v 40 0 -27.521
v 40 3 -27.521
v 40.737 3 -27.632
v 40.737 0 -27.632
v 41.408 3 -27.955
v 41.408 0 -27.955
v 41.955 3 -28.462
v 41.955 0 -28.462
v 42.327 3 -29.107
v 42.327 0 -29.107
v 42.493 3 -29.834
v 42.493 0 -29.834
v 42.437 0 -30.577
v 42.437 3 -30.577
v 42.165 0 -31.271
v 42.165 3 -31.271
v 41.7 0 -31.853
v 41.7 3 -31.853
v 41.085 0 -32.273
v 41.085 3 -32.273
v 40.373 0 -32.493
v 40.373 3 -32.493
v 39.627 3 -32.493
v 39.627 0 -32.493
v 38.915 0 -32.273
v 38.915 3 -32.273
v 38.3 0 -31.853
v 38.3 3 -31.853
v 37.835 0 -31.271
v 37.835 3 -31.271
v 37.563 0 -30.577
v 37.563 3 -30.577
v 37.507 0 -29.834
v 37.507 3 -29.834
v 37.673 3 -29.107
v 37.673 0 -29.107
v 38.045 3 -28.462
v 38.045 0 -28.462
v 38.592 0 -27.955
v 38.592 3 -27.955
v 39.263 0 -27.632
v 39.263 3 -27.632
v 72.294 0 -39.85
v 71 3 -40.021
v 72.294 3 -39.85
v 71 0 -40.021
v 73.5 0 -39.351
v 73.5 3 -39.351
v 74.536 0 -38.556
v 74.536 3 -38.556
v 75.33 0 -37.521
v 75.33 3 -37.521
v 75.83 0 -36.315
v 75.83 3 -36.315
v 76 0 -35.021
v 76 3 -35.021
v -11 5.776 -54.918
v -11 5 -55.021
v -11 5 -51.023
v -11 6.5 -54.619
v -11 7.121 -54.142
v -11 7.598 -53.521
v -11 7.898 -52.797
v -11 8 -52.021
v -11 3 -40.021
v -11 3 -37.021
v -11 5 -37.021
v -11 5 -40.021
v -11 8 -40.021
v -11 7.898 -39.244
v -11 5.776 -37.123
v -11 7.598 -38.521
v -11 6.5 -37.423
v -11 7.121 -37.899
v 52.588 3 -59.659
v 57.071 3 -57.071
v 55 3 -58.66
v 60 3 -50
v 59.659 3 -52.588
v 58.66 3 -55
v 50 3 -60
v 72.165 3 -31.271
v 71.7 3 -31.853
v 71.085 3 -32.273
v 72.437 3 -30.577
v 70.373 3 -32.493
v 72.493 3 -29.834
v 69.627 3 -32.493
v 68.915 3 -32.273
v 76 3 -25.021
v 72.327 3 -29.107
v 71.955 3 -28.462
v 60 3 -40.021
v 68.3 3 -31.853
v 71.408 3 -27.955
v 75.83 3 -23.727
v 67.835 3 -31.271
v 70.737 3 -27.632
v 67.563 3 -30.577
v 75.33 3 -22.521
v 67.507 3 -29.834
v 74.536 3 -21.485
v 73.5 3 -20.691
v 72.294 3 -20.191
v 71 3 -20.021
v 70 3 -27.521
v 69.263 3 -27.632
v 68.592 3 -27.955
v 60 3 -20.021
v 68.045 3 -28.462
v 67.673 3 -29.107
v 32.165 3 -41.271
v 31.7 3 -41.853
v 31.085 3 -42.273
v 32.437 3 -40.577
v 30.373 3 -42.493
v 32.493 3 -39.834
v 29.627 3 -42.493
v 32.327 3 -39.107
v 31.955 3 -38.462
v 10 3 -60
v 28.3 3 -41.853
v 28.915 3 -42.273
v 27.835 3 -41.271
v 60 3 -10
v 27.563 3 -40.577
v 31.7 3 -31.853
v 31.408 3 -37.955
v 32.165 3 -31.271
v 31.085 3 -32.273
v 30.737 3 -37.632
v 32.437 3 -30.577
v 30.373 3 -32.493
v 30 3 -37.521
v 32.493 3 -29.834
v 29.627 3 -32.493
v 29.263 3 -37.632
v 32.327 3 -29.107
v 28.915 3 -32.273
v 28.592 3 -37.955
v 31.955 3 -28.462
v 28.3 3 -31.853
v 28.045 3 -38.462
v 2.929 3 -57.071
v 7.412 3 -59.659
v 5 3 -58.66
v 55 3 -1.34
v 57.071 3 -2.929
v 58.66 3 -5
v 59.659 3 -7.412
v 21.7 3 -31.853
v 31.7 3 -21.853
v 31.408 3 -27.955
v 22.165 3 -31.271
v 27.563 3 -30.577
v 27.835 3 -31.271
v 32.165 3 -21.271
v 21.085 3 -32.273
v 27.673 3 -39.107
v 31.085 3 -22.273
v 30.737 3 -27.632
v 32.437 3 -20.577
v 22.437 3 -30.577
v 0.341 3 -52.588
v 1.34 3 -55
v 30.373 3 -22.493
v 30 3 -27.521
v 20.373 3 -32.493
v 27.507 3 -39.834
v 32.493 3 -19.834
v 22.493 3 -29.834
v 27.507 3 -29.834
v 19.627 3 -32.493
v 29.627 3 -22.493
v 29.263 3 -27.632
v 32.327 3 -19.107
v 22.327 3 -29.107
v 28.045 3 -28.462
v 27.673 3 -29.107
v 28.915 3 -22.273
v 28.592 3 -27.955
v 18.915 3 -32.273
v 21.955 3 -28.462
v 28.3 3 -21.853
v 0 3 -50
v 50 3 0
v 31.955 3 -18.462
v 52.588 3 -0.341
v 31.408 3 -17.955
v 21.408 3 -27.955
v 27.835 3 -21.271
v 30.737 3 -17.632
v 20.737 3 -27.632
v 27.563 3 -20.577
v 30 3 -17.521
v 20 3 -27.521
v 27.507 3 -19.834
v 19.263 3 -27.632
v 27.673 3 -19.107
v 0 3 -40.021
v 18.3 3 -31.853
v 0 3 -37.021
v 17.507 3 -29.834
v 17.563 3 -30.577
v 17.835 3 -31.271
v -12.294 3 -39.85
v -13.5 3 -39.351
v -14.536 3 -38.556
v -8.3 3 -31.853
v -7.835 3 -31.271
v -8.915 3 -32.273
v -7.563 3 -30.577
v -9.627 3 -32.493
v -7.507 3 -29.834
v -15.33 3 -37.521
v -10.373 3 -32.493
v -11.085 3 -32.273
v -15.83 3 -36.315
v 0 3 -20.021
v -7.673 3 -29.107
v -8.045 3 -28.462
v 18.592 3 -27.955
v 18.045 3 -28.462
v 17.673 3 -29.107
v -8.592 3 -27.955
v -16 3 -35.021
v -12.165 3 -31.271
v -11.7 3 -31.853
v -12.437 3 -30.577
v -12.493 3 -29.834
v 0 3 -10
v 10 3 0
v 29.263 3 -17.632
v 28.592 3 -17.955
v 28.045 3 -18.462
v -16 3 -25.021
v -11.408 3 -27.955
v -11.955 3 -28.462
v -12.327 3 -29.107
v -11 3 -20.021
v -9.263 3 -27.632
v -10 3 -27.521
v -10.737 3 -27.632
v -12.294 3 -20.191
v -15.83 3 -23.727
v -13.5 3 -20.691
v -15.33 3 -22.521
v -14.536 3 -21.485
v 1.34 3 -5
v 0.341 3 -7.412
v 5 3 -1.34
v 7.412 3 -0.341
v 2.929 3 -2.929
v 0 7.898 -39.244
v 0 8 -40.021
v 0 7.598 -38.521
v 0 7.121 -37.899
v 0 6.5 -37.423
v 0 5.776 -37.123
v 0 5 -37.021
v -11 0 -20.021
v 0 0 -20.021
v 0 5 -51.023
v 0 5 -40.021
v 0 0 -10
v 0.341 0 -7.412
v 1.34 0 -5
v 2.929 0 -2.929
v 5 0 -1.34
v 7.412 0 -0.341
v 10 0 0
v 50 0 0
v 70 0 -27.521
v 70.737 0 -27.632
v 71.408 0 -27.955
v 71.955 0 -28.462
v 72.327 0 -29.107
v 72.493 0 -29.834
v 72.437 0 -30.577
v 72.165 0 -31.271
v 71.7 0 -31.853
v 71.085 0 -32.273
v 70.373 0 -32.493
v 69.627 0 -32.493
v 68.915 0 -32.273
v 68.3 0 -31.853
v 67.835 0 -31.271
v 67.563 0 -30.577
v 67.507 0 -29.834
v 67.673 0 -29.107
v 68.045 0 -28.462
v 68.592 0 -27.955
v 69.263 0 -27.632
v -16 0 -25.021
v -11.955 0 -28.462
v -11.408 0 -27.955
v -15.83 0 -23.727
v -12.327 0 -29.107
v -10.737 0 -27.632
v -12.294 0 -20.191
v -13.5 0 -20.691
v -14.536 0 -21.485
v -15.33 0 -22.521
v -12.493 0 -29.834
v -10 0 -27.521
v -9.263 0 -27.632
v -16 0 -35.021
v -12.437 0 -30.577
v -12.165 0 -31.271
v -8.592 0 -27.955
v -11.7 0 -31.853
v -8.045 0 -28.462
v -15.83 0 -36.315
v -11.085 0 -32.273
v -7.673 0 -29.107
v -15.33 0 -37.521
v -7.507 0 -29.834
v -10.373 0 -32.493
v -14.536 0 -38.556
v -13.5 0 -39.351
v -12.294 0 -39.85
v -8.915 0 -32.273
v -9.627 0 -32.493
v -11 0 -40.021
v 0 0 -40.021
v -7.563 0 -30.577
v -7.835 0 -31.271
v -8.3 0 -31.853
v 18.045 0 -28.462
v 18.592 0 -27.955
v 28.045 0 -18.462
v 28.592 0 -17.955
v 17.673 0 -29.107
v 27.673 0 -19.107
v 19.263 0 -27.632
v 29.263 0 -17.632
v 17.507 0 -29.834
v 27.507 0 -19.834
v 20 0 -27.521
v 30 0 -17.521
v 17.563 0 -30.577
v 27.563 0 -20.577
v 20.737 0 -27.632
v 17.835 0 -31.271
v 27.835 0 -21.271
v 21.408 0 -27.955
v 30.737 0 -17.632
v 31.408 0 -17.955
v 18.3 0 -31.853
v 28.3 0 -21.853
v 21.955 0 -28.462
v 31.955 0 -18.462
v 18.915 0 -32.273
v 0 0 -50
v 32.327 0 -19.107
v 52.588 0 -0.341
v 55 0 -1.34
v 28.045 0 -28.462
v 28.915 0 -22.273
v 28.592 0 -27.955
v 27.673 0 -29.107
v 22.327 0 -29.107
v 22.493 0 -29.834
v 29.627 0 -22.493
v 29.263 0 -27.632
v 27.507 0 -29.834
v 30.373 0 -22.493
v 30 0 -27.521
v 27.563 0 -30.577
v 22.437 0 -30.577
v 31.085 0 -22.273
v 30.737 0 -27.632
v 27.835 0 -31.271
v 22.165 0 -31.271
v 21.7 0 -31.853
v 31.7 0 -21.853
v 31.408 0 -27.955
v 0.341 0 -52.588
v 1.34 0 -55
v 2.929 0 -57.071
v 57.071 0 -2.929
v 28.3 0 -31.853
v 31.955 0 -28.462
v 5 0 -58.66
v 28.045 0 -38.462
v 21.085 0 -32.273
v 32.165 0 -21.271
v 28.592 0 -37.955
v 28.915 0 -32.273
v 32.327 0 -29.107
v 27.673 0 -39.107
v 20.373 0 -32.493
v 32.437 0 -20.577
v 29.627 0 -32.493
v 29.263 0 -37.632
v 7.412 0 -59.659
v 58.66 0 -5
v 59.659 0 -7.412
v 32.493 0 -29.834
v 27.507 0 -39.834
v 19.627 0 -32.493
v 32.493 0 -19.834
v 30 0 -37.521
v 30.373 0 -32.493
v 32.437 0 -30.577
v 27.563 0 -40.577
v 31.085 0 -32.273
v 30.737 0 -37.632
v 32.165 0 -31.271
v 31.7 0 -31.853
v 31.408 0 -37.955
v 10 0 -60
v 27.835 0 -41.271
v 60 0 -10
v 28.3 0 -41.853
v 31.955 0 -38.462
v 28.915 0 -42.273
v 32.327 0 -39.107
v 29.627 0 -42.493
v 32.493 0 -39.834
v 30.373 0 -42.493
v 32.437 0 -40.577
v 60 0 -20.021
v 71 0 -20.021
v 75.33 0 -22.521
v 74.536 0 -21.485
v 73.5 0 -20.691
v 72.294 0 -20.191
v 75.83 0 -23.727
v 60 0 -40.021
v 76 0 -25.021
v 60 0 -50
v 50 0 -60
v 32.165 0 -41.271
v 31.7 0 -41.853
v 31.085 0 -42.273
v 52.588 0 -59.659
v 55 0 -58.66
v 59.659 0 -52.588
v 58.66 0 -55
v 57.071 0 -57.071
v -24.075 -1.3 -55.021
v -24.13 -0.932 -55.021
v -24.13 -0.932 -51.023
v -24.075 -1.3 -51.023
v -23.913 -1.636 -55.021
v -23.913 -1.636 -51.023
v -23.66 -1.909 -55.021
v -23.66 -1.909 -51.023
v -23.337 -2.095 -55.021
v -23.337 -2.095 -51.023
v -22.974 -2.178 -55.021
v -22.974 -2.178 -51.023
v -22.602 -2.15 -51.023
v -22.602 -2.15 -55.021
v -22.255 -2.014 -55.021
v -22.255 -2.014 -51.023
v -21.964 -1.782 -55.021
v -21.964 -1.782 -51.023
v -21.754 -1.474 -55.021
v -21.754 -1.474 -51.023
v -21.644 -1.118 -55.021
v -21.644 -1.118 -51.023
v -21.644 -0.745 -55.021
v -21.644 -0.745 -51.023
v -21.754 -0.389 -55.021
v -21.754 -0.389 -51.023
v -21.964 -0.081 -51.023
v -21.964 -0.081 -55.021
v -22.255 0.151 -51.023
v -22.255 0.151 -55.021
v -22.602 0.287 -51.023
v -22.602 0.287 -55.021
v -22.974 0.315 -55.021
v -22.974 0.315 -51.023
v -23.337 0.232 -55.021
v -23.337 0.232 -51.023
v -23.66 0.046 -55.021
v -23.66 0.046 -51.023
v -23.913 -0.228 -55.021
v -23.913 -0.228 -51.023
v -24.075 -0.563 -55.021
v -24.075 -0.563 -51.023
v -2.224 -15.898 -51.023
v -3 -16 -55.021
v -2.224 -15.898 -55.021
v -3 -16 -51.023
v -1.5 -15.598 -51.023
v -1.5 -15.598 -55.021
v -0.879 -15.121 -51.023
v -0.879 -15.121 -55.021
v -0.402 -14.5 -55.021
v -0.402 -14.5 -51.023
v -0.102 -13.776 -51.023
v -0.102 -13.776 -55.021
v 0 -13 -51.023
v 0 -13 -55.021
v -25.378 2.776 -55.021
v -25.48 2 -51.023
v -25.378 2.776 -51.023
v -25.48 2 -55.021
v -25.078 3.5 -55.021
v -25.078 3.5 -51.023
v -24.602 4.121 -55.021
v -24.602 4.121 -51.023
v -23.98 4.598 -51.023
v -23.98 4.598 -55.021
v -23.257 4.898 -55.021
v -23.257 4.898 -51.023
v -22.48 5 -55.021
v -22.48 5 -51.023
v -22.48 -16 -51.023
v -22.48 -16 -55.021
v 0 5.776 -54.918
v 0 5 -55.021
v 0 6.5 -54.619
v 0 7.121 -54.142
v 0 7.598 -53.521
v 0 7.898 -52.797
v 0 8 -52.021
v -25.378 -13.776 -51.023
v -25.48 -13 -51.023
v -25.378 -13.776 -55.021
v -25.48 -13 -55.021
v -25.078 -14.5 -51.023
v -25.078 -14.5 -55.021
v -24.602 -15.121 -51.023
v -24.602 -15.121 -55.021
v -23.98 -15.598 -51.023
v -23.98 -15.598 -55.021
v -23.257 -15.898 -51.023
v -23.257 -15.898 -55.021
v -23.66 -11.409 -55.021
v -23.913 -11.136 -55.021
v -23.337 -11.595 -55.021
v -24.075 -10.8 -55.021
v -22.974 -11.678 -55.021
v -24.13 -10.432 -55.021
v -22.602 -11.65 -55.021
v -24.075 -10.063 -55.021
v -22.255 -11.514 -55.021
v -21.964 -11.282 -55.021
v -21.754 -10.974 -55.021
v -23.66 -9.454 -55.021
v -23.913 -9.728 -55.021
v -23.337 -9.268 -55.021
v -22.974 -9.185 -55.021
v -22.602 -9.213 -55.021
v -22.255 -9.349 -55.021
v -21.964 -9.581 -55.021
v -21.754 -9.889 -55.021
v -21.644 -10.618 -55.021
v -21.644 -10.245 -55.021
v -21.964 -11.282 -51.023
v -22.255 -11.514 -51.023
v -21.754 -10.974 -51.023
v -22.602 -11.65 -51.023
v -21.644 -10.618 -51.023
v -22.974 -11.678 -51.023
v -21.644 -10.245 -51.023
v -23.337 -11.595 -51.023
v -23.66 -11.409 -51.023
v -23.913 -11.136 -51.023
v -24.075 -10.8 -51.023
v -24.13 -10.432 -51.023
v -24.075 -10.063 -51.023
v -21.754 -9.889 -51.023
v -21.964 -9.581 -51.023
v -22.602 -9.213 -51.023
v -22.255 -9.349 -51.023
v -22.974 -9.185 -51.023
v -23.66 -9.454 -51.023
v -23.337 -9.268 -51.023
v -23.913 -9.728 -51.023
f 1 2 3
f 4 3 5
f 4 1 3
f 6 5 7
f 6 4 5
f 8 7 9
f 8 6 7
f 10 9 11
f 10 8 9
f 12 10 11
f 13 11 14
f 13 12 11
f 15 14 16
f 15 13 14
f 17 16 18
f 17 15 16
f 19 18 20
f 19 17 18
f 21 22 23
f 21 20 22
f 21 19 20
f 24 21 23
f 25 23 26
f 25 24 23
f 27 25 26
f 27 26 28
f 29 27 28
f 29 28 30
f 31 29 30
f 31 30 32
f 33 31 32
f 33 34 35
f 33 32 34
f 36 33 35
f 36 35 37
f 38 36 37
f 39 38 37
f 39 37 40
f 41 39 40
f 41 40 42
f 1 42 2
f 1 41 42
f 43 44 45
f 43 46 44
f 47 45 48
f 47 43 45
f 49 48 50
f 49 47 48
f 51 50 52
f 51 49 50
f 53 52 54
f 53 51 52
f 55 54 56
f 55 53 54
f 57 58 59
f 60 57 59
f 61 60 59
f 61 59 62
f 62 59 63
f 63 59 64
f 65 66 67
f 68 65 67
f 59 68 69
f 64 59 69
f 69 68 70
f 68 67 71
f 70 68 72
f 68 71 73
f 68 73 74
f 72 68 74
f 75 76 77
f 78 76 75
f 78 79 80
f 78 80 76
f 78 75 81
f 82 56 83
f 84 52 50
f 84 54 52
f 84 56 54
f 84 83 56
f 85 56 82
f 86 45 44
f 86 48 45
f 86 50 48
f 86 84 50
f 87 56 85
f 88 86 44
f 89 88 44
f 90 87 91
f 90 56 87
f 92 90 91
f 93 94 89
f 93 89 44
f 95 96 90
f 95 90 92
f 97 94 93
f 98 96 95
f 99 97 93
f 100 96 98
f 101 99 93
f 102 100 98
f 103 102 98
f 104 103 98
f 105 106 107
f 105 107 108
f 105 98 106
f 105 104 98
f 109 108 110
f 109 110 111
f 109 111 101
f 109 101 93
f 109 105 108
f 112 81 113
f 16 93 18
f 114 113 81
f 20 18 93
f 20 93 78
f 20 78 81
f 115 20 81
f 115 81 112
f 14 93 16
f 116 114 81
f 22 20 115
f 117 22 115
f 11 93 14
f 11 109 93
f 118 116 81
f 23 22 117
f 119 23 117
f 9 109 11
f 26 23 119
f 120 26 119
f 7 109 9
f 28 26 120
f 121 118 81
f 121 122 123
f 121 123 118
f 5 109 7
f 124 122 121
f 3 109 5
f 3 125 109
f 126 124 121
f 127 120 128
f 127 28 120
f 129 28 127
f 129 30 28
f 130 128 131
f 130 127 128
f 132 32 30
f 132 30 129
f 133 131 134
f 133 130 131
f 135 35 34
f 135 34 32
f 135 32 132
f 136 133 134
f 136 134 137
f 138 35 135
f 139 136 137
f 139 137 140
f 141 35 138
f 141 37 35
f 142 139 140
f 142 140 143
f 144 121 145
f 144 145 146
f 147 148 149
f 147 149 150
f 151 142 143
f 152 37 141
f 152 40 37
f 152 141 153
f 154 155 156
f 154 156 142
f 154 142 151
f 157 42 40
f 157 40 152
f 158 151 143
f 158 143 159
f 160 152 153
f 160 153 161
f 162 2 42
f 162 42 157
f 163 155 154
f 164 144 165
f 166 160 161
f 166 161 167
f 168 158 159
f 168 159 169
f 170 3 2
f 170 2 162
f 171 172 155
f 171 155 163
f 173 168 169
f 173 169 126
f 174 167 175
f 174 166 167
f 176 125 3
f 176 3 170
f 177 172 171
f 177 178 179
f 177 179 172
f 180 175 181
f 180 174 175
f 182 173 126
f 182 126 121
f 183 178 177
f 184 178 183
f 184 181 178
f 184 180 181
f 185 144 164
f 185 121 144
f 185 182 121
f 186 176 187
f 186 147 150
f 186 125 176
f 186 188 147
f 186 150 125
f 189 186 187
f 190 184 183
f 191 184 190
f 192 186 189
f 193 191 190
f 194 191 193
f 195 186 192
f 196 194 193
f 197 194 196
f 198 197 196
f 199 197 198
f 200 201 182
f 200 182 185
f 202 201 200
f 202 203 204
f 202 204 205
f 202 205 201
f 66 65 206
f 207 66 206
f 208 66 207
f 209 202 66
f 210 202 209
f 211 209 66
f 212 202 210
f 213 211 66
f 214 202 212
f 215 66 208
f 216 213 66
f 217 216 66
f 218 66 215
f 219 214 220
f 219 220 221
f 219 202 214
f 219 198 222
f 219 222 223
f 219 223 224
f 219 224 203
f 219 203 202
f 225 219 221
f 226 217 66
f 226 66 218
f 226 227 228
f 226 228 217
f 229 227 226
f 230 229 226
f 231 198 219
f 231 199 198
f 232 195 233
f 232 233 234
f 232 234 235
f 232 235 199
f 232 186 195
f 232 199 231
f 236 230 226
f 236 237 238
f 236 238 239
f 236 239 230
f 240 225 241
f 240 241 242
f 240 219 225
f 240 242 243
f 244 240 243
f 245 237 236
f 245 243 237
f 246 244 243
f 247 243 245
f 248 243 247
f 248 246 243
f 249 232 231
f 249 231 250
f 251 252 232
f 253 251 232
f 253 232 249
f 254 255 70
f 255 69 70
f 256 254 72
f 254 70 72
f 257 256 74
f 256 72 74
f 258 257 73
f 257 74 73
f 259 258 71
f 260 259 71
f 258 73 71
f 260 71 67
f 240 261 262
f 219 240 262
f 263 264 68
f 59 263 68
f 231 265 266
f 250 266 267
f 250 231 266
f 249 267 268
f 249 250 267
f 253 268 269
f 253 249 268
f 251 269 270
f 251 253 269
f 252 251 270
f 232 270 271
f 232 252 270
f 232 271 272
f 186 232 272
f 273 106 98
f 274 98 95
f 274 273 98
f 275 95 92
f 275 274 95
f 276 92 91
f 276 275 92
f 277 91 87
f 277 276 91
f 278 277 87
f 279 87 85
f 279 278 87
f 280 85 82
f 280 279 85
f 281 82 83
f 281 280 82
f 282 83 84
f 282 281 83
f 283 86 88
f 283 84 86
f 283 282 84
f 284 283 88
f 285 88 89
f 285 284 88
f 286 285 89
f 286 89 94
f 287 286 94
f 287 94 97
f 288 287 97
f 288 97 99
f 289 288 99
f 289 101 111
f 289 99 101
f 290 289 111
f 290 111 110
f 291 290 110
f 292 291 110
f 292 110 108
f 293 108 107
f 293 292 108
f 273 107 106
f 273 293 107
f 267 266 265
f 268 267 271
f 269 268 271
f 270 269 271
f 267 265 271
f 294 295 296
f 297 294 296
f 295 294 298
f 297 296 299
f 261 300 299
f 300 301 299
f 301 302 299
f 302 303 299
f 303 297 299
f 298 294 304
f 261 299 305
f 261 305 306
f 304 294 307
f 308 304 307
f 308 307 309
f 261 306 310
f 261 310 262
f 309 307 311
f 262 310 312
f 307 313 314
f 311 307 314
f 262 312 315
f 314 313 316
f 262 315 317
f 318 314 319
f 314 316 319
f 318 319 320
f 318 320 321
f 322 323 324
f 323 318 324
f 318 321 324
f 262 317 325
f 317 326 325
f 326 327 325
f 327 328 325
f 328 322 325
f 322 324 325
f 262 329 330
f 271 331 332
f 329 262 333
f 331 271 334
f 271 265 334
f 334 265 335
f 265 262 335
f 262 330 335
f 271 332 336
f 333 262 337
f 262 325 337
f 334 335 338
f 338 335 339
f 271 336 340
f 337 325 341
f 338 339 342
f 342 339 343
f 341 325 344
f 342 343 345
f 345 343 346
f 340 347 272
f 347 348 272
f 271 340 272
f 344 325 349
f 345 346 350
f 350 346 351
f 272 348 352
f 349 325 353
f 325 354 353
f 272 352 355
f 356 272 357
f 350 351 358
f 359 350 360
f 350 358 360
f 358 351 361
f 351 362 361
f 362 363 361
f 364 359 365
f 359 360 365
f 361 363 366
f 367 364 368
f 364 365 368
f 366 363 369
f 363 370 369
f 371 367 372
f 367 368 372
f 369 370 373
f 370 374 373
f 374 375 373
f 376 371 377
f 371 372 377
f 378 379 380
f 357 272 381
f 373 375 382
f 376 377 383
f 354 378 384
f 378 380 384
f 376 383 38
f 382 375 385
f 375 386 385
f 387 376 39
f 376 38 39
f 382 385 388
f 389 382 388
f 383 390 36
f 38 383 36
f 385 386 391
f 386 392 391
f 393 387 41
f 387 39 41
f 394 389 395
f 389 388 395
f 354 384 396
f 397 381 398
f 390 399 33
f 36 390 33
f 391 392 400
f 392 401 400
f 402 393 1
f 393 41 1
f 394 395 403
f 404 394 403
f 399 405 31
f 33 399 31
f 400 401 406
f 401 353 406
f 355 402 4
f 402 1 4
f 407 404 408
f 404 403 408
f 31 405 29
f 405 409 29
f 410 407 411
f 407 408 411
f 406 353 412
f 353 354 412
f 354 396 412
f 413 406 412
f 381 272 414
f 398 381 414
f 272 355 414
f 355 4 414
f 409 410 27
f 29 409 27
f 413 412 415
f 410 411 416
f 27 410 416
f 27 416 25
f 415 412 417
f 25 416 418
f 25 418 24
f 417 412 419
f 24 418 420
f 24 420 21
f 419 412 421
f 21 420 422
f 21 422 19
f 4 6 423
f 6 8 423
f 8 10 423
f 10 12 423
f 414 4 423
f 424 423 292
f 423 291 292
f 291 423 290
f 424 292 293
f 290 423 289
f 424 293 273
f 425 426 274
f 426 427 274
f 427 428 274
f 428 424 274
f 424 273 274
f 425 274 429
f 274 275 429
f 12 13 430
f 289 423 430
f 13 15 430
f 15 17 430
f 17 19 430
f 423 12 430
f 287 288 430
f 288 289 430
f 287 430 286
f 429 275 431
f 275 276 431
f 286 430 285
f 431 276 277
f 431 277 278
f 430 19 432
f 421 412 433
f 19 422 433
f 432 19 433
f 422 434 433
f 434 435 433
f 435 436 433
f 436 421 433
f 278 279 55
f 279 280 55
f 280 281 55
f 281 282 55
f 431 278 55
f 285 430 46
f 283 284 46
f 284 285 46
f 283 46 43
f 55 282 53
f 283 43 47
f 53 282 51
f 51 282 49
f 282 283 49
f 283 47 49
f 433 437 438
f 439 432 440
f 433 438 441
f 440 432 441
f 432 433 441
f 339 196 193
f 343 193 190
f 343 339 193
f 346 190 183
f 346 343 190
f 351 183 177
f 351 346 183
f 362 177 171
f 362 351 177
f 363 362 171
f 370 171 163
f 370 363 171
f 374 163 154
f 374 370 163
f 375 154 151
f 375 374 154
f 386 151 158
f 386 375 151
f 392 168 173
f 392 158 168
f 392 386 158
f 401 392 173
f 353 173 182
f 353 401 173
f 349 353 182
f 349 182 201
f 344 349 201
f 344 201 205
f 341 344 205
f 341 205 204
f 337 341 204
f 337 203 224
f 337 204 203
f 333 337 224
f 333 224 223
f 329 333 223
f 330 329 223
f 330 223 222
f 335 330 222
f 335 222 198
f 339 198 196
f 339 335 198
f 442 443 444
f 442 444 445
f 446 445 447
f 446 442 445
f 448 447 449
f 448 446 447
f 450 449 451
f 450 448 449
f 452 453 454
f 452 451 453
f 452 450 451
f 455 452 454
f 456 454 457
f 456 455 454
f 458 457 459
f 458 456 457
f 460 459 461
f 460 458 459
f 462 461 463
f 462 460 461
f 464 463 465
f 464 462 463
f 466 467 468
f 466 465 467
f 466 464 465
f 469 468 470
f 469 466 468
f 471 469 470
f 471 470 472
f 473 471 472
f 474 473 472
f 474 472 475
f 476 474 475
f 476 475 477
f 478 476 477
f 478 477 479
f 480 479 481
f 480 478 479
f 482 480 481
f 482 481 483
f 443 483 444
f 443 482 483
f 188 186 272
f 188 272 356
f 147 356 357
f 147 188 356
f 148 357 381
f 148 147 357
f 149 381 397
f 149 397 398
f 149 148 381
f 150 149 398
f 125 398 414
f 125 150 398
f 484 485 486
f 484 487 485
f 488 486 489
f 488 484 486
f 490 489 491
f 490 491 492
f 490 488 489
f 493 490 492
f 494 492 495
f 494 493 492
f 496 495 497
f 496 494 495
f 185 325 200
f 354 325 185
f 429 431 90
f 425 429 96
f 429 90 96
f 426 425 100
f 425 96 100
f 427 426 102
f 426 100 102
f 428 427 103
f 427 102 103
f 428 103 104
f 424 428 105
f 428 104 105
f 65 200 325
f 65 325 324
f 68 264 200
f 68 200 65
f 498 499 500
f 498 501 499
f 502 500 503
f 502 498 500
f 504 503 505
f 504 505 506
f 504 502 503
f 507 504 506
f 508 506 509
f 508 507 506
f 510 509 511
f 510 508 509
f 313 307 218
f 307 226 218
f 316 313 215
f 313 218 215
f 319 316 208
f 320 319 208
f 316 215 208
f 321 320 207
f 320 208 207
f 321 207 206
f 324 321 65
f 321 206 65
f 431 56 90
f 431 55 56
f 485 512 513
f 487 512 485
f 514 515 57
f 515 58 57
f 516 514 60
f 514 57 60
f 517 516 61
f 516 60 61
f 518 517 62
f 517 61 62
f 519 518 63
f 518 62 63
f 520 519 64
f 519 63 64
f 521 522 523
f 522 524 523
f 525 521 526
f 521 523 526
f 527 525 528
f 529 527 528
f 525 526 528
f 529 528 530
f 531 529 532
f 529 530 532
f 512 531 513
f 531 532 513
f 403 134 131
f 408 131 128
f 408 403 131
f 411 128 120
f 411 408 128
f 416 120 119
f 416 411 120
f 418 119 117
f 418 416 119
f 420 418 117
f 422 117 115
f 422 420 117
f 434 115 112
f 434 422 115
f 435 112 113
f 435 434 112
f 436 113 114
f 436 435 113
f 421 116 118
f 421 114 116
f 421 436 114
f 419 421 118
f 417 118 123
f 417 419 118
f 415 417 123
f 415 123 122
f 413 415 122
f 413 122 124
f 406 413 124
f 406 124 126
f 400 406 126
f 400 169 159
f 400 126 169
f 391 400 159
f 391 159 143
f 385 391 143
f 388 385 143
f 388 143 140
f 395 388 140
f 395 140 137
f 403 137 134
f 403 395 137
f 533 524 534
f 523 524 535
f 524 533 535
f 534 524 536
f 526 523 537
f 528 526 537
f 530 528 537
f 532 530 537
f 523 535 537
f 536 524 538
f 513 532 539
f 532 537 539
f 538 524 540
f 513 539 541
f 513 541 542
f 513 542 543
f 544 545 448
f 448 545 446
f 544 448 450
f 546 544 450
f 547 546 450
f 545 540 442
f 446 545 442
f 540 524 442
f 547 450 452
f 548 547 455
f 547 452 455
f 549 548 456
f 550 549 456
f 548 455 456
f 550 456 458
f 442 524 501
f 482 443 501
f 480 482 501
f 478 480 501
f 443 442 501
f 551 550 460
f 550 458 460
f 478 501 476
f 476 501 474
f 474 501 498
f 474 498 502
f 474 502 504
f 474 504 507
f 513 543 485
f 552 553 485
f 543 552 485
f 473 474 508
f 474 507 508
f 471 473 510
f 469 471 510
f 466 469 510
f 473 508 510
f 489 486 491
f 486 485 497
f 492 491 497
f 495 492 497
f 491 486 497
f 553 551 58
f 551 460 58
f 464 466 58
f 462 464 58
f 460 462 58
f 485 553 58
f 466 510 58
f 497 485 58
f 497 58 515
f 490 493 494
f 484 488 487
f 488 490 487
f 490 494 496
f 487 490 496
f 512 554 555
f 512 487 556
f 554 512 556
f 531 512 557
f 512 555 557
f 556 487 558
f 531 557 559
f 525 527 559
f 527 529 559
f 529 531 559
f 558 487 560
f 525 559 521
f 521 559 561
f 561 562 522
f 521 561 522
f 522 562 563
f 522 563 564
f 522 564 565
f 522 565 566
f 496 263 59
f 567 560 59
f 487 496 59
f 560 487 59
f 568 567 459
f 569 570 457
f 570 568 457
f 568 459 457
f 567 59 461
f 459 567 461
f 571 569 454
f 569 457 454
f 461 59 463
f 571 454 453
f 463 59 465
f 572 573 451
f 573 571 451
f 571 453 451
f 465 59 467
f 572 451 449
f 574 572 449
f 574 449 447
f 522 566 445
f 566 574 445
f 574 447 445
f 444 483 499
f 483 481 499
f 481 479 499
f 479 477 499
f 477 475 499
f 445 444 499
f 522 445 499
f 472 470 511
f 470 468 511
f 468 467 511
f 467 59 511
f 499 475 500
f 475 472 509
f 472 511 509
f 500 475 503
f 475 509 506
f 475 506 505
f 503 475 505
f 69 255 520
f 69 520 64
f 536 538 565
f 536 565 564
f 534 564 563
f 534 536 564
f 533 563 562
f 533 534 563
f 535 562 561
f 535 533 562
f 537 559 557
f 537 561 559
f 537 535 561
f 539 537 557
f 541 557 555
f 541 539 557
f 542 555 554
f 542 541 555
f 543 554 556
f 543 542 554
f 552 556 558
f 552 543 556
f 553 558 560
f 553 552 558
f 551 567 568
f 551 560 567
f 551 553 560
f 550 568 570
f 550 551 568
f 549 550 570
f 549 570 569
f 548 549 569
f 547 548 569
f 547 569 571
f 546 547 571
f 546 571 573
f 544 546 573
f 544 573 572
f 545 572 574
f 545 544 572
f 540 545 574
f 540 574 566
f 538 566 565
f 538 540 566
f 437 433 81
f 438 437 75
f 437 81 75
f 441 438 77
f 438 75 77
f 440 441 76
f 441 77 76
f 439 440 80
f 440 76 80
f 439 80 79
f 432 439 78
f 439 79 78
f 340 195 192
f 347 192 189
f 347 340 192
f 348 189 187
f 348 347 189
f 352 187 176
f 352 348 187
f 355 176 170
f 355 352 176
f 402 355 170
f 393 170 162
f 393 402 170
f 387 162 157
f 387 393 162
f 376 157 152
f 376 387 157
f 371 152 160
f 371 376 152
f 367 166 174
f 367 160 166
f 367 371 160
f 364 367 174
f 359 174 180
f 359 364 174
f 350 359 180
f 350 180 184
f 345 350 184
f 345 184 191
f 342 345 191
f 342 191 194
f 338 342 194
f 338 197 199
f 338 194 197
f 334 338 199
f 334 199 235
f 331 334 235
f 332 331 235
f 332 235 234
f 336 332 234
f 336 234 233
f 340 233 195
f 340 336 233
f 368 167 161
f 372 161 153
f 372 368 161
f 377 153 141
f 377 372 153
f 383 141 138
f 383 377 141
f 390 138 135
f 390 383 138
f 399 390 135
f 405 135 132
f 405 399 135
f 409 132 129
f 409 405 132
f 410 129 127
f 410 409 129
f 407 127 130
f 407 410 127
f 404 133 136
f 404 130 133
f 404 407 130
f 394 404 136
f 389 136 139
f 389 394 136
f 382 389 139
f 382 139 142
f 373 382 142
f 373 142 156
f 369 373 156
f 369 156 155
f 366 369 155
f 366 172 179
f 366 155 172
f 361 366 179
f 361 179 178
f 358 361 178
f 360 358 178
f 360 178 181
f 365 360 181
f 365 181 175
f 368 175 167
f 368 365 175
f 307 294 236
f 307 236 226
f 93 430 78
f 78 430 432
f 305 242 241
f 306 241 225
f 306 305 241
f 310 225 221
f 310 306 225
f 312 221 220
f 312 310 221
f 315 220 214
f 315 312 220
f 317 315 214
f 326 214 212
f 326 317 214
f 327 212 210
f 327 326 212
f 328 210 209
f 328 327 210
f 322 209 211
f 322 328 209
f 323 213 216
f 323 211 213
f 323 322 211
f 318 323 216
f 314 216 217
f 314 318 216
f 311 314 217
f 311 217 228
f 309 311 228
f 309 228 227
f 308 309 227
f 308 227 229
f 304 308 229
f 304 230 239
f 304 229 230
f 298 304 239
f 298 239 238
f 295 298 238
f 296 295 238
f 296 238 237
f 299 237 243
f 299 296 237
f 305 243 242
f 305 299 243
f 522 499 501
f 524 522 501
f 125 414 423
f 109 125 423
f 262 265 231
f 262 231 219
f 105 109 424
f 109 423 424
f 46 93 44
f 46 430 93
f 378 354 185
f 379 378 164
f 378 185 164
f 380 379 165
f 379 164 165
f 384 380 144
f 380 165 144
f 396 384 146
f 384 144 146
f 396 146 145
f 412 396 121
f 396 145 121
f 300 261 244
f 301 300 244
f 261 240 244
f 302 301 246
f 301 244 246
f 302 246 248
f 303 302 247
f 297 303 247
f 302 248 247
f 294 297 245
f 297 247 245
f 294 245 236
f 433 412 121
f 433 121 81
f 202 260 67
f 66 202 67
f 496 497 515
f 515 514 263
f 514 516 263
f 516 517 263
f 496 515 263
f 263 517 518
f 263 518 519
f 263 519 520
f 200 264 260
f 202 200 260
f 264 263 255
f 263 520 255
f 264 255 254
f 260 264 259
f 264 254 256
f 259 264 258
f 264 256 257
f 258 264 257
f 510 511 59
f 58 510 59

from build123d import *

# Parameters (mm, degrees)
SKETCH1_W               = 60
SKETCH1_H               = 60
SKETCH1_R               = 2.5
BOSS_EXTRUDE2_DEPTH     = 5
SKETCH3_W               = 35
SKETCH3_H               = 20
BOSS_EXTRUDE3_DEPTH     = 5
SKETCH5_R               = 2.5
CUT_EXTRUDE1_DEPTH      = 113.472218792
FILLET1_R               = 10
FILLET2_R               = 10
FILLET3_R               = 10
CUT_EXTRUDE2_DEPTH      = 113.472218792
CUT_EXTRUDE2_DEPTH_BACK = 113.472218792
SKETCH6_W               = 130
SKETCH6_H               = 2
CUT_EXTRUDE4_DEPTH      = 113.401067611
CUT_EXTRUDE4_DEPTH_BACK = 113.401067611
FILLET4_R               = 5
SKETCH8_W               = 11
SKETCH8_H               = 5
BOSS_EXTRUDE4_DEPTH     = 3
SKETCH9_W               = 11
SKETCH9_H               = 3
BOSS_EXTRUDE5_DEPTH     = 15
BOSS_EXTRUDE6_DEPTH     = 21
CUT_EXTRUDE5_DEPTH      = 93.926839714
CUT_EXTRUDE5_DEPTH_BACK = 10
SKETCH11_R              = 1.25
FILLET5_R               = 3


with BuildPart() as part:
    # Sketch1 → Boss-Extrude2 (new body)
    with BuildSketch(Plane(origin=(0, 0, 0), x_dir=(1, 0, 0), z_dir=(0, 1, 0))):
        with Locations((30, 30)):
            Rectangle(SKETCH1_W, SKETCH1_H)
        with Locations(Location((30, 40.020691429, 0), (0, 0, 270))):
            Circle(SKETCH1_R, mode=Mode.SUBTRACT)
        with Locations(Location((20, 30.020691429, 0), (0, 0, 270))):
            Circle(SKETCH1_R, mode=Mode.SUBTRACT)
        with Locations(Location((30, 20.020691429, 0), (0, 0, 270))):
            Circle(SKETCH1_R, mode=Mode.SUBTRACT)
        with Locations(Location((40, 30.020691429, 0), (0, 0, 270))):
            Circle(SKETCH1_R, mode=Mode.SUBTRACT)
        with Locations(Location((30, 30.020691429, 0), (0, 0, 270))):
            Circle(SKETCH1_R, mode=Mode.SUBTRACT)
    extrude(amount=BOSS_EXTRUDE2_DEPTH)

    # Sketch3 → Boss-Extrude3 (add)
    with BuildSketch(Plane(origin=(0, 0, 0), x_dir=(1, 0, 0), z_dir=(0, 1, 0))):
        with Locations((77.5, 30.020691429)):
            Rectangle(SKETCH3_W, SKETCH3_H)
        with Locations((-17.5, 30.020691429)):
            Rectangle(SKETCH3_W, SKETCH3_H)
    extrude(amount=BOSS_EXTRUDE3_DEPTH)

    # Sketch5 → Cut-Extrude1 (cut, through all)
    with BuildSketch(Plane(origin=(0, 0, 0), x_dir=(1, 0, 0), z_dir=(0, 1, 0))):
        with Locations(Location((70, 30.020691429, 0), (0, 0, 270))):
            Circle(SKETCH5_R)
        with Locations(Location((-10, 30.020691429, 0), (0, 0, 270))):
            Circle(SKETCH5_R)
    extrude(amount=CUT_EXTRUDE1_DEPTH, mode=Mode.SUBTRACT)

    # Fillet1
    fillet1_edges = [part.edges().sort_by_distance(p)[0] for p in [
        (95, 2.5, -20.020691429),
        (95, 2.5, -40.020691429),
    ]]
    fillet(fillet1_edges, radius=FILLET1_R - 0.0001)  # a hair under: the kernel refuses the full size

    # Fillet2
    fillet2_edges = [part.edges().sort_by_distance(p)[0] for p in [
        (-35, 2.5, -20.020691429),
        (-35, 2.5, -40.020691429),
    ]]
    fillet(fillet2_edges, radius=FILLET2_R - 0.0001)  # a hair under: the kernel refuses the full size

    # Fillet3
    fillet3_edges = [part.edges().sort_by_distance(p)[0] for p in [
        (0, 2.5, -60),
        (60, 2.5, -60),
        (60, 2.5, 0),
        (0, 2.5, 0),
    ]]
    fillet(fillet3_edges, radius=FILLET3_R)

    # Sketch6 → Cut-Extrude2 (cut, two sides: drawn at the far end of the back side and taken through both)
    with BuildSketch(Plane(origin=(0, 0, -60), x_dir=(-1, 0, 0), z_dir=(0, 0, -1)).offset(-CUT_EXTRUDE2_DEPTH_BACK)):
        with Locations((-30, 4)):
            Rectangle(SKETCH6_W, SKETCH6_H)
    extrude(amount=CUT_EXTRUDE2_DEPTH + CUT_EXTRUDE2_DEPTH_BACK, mode=Mode.SUBTRACT)

    # Sketch7 → Cut-Extrude4 (cut, two sides: drawn at the far end of the back side and taken through both)
    with BuildSketch(Plane(origin=(0, 3, 0), x_dir=(1, 0, 0), z_dir=(0, 1, 0)).offset(-CUT_EXTRUDE4_DEPTH_BACK)):
        Polygon((-16, 40.020691429), (-16, 42.339149427), (-38.923164287, 42.339149427), (-38.923164287, 39.725242292), (-38.923164287, 20.020691429), (-16, 20.020691429), align=None)
        Polygon((98.923164287, 20.020691429), (98.923164287, 39.725242292), (98.923164287, 44.006554538), (76, 44.006554538), (76, 40.020691429), (76, 20.020691429), align=None)
    extrude(amount=CUT_EXTRUDE4_DEPTH + CUT_EXTRUDE4_DEPTH_BACK, mode=Mode.SUBTRACT)

    # Fillet4
    fillet4_edges = [part.edges().sort_by_distance(p)[0] for p in [
        (-16, 1.5, -20.020691429),
        (-16, 1.5, -40.020691429),
        (76, 1.5, -40.020691429),
        (76, 1.5, -20.020691429),
    ]]
    fillet(fillet4_edges, radius=FILLET4_R)

    # Sketch8 → Boss-Extrude4 (add)
    with BuildSketch(Plane(origin=(0, 0, -40.020691429), x_dir=(-1, 0, 0), z_dir=(0, 0, -1))):
        with Locations((5.5, 5.5)):
            Rectangle(SKETCH8_W, SKETCH8_H)
    extrude(amount=-BOSS_EXTRUDE4_DEPTH)

    # Sketch9 → Boss-Extrude5 (add)
    with BuildSketch(Plane(origin=(0, 0, -40.020691429), x_dir=(-1, 0, 0), z_dir=(0, 0, -1))):
        with Locations((5.5, 6.5)):
            Rectangle(SKETCH9_W, SKETCH9_H)
    extrude(amount=BOSS_EXTRUDE5_DEPTH)

    # Sketch10 → Boss-Extrude6 (add)
    with BuildSketch(Plane.XZ.offset(-5)):
        Polygon((-25.480214152, -51.023499873), (-25.480214152, -55.020691429), (-11, -55.020691429), (0, -55.020691429), (0, -51.023499873), align=None)
    extrude(amount=BOSS_EXTRUDE6_DEPTH)

    # Sketch11 → Cut-Extrude5 (cut, two sides: drawn at the far end of the back side and taken through both)
    with BuildSketch(Plane.XY.offset(-51.023499873).offset(-CUT_EXTRUDE5_DEPTH_BACK)):
        with Locations(Location((-22.880182159, -0.931652135, 0), (0, 0, 180))):
            Circle(SKETCH11_R)
        with Locations(Location((-22.880182159, -10.431652135, 0), (0, 0, 180))):
            Circle(SKETCH11_R)
    extrude(amount=CUT_EXTRUDE5_DEPTH + CUT_EXTRUDE5_DEPTH_BACK, mode=Mode.SUBTRACT)

    # Fillet5
    fillet5_edges = [part.edges().sort_by_distance(p)[0] for p in [
        (-5.5, 8, -37.020691429),
        (-5.5, 8, -55.020691429),
        (0, -16, -53.022095651),
        (-25.480214152, 5, -53.022095651),
        (-25.480214152, -16, -53.022095651),
    ]]
    fillet(fillet5_edges, radius=FILLET5_R)


solid = part.part
